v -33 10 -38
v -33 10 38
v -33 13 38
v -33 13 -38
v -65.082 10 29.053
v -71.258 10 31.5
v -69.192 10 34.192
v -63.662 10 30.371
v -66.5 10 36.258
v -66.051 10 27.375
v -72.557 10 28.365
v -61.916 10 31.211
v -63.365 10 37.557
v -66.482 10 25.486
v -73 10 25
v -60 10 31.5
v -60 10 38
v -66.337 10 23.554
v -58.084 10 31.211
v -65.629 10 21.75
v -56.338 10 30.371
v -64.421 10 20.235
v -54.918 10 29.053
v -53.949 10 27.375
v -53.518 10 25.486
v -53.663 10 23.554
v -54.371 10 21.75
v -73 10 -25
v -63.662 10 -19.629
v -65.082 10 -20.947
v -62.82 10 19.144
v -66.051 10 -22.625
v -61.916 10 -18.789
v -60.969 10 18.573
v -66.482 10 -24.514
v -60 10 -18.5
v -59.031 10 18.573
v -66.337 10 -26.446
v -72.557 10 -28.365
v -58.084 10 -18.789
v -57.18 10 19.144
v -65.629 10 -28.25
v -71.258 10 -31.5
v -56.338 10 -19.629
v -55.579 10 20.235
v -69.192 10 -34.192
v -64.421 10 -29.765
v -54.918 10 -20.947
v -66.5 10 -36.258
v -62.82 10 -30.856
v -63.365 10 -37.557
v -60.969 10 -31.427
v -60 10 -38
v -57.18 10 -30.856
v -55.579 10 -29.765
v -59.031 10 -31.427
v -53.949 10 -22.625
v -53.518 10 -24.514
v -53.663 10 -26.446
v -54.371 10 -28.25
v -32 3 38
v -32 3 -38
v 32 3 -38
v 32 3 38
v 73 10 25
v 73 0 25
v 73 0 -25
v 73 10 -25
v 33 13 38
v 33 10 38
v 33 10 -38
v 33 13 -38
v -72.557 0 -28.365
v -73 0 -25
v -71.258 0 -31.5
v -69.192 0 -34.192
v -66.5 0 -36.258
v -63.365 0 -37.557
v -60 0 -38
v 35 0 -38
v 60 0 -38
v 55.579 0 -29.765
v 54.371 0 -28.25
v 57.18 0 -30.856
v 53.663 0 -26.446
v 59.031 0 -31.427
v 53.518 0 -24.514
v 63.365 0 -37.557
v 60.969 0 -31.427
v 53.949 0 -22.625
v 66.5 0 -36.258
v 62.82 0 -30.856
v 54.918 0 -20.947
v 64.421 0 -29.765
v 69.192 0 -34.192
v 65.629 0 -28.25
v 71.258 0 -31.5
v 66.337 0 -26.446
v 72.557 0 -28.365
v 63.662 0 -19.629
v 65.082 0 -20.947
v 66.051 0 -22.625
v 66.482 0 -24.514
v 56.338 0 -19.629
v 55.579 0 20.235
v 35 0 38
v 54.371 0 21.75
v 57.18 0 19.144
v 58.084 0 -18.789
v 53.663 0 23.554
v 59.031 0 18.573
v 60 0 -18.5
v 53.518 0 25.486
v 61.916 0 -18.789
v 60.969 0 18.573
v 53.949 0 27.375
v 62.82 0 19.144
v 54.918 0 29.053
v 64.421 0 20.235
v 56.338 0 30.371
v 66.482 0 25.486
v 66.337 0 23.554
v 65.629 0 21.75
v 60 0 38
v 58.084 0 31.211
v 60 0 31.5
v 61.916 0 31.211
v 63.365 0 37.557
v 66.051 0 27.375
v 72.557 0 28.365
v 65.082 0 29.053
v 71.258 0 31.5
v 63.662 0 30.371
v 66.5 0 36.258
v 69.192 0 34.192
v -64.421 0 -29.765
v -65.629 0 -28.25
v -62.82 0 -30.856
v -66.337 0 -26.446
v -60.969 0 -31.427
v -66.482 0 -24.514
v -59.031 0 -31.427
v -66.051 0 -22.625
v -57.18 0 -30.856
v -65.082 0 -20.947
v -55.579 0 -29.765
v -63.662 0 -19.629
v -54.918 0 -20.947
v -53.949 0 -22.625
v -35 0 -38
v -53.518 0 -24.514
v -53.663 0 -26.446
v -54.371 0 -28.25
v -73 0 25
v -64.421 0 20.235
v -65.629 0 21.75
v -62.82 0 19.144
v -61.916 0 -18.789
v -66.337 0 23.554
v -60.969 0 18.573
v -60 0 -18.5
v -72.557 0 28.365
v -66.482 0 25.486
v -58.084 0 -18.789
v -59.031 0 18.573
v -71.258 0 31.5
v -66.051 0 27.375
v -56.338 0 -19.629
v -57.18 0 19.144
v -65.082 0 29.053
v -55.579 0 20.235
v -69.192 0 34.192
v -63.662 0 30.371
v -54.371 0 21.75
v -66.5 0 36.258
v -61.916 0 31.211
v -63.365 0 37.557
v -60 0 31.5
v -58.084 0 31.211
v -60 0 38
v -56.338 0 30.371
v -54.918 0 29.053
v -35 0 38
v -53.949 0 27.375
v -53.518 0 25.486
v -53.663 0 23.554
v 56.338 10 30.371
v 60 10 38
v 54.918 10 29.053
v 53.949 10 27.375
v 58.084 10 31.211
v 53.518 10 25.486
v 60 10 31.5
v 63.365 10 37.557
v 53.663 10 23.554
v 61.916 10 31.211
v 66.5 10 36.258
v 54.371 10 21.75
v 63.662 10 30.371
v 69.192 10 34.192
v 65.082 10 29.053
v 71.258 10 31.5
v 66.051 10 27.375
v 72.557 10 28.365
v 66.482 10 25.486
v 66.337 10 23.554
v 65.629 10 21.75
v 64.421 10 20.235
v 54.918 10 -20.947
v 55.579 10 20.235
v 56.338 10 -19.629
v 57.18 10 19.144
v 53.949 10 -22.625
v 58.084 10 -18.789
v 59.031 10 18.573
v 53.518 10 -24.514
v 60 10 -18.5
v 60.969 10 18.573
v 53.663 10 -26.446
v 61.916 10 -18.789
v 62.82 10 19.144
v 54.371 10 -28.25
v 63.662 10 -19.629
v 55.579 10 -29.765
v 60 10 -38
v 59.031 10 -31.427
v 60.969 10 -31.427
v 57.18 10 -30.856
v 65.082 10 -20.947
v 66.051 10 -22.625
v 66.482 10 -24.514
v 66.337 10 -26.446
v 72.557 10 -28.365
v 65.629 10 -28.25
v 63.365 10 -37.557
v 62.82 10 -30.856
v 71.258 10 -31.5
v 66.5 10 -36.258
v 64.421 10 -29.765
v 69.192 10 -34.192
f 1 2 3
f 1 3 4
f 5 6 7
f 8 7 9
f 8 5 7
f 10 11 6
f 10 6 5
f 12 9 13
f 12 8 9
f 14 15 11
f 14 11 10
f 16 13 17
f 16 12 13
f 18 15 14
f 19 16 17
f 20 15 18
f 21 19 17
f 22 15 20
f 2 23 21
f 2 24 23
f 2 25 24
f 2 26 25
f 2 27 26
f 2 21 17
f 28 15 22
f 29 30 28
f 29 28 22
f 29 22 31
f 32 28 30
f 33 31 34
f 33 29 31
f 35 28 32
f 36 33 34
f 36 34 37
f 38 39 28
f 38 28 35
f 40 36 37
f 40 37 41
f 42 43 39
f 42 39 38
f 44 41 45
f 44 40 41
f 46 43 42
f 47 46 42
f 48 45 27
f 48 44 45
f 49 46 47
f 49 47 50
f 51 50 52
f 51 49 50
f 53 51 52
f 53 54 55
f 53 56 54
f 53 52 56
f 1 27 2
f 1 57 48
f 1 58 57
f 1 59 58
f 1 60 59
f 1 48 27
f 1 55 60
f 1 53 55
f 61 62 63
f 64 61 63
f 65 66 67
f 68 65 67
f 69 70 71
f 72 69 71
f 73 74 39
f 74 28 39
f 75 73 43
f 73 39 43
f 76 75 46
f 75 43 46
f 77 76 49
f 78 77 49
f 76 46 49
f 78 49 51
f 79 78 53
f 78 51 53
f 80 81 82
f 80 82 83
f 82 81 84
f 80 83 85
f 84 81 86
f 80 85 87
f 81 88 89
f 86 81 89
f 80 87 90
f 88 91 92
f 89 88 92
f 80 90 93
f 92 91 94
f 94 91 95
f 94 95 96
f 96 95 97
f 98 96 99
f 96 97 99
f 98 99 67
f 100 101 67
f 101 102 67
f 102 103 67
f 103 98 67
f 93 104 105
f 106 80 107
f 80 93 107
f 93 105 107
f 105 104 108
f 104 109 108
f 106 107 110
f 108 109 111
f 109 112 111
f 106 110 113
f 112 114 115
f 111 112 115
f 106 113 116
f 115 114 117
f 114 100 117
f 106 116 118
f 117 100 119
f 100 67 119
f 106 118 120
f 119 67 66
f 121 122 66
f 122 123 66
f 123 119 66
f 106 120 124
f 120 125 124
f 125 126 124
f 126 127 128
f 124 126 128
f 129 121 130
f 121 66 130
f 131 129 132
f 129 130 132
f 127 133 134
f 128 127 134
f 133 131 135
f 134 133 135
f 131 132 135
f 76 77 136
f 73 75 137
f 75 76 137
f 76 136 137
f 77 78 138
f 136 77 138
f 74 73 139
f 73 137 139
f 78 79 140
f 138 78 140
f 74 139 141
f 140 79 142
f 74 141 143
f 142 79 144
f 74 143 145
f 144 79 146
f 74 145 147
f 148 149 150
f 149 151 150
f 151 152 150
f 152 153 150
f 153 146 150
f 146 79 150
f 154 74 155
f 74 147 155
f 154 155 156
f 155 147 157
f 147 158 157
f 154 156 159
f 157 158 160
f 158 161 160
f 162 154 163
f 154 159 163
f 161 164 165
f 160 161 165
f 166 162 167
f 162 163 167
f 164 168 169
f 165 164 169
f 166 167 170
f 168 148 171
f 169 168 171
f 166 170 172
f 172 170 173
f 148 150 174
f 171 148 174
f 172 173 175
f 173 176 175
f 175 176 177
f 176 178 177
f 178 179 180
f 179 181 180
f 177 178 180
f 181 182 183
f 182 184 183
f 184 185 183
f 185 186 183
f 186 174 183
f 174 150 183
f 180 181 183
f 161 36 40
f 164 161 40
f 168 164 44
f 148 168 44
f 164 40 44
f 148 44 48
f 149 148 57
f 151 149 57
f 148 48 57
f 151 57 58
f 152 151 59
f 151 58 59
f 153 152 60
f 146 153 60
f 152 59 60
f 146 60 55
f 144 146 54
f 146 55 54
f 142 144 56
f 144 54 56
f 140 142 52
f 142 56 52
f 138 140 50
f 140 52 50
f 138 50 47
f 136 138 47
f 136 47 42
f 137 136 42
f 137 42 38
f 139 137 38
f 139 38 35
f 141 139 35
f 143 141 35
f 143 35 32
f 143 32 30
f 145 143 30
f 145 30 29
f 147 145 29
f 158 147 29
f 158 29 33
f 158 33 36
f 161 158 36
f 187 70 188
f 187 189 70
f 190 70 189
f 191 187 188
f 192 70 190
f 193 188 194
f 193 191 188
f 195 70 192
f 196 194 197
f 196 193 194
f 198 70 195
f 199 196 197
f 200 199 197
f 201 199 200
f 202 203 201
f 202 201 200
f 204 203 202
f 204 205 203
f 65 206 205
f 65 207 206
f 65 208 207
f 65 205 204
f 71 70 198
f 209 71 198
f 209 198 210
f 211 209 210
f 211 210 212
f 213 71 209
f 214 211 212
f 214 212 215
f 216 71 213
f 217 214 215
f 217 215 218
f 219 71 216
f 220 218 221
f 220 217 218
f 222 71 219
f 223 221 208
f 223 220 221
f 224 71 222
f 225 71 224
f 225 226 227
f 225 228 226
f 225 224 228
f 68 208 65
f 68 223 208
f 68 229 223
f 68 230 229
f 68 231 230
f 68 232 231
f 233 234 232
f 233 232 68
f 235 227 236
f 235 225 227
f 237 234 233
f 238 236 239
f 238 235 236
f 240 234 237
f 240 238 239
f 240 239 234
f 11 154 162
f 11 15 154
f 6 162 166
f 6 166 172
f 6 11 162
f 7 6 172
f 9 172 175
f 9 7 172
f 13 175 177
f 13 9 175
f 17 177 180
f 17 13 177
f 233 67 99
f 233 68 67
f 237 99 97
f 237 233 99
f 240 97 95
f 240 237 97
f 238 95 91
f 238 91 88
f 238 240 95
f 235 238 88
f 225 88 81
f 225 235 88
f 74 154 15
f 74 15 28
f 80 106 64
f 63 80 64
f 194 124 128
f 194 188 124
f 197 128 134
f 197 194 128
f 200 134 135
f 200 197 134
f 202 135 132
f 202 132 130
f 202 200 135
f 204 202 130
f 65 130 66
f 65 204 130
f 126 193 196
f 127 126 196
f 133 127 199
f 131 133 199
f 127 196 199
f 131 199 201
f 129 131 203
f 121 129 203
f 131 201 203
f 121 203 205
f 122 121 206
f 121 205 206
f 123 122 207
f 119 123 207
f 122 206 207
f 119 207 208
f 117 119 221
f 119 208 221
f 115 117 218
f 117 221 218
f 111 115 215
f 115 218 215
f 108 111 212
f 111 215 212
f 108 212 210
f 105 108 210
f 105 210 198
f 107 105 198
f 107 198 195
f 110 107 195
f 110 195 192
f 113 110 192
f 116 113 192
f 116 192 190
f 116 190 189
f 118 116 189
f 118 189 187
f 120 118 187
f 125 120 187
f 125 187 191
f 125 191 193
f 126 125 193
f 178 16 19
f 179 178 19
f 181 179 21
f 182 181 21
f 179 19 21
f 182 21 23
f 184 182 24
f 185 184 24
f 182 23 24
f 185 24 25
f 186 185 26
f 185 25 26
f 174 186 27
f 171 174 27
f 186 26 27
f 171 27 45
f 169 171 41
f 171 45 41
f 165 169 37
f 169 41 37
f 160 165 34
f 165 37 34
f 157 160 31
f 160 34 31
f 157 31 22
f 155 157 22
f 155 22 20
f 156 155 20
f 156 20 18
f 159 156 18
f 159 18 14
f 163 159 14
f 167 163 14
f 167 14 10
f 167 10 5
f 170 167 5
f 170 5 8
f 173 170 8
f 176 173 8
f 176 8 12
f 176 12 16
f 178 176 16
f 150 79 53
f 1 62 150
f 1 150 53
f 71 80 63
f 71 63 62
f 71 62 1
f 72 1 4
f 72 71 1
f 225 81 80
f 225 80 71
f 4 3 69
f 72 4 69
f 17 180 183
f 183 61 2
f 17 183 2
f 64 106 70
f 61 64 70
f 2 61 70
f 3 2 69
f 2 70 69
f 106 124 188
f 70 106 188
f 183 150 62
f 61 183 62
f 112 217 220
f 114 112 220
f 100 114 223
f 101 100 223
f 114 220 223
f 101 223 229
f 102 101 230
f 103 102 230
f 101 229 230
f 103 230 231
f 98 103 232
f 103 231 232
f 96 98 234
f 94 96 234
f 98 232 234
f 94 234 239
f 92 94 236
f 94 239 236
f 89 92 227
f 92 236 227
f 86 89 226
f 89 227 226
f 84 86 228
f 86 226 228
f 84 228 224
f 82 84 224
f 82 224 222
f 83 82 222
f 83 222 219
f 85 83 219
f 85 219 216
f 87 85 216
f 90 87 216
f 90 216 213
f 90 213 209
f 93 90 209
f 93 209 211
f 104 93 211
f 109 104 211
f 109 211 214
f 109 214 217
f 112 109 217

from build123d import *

# Parameters (mm, degrees)
CROQUIS2_W              = 146
CROQUIS2_H              = 76
SALIENTE_EXTRUIR2_DEPTH = 10
CROQUIS3_W              = 66
CROQUIS3_H              = 76
SALIENTE_EXTRUIR3_DEPTH = 3
REDONDEO1_R             = 13
REDONDEO2_R             = 13
REDONDEO3_R             = 13
REDONDEO4_R             = 13
CROQUIS5_R              = 6.5
CORTAR_EXTRUIR1_DEPTH   = 83.903558428
CROQUIS6_W              = 72
CROQUIS6_H              = 76
CORTAR_EXTRUIR2_DEPTH   = 3
CHAFL_N1_SIZE           = 4
CHAFL_N2_SIZE           = 4


with BuildPart() as part:
    # Croquis2 → Saliente-Extruir2 (new body)
    with BuildSketch(Plane(origin=(0, 0, 0), x_dir=(1, 0, 0), z_dir=(0, 1, 0))):
        Rectangle(CROQUIS2_W, CROQUIS2_H)
    extrude(amount=SALIENTE_EXTRUIR2_DEPTH)

    # Croquis3 → Saliente-Extruir3 (add)
    with BuildSketch(Plane(origin=(0, 10, 0), x_dir=(1, 0, 0), z_dir=(0, 1, 0))):
        Rectangle(CROQUIS3_W, CROQUIS3_H)
    extrude(amount=SALIENTE_EXTRUIR3_DEPTH)

    # Redondeo1
    redondeo1_edges = [part.edges().sort_by_distance(p)[0] for p in [
        (-73, 5, -38),
    ]]
    fillet(redondeo1_edges, radius=REDONDEO1_R)

    # Redondeo2
    redondeo2_edges = [part.edges().sort_by_distance(p)[0] for p in [
        (-73, 5, 38),
    ]]
    fillet(redondeo2_edges, radius=REDONDEO2_R)

    # Redondeo3
    redondeo3_edges = [part.edges().sort_by_distance(p)[0] for p in [
        (73, 5, 38),
    ]]
    fillet(redondeo3_edges, radius=REDONDEO3_R)

    # Redondeo4
    redondeo4_edges = [part.edges().sort_by_distance(p)[0] for p in [
        (73, 5, -38),
    ]]
    fillet(redondeo4_edges, radius=REDONDEO4_R)

    # Croquis5 → Cortar-Extruir1 (cut, through all)
    with BuildSketch(Plane(origin=(0, 10, 0), x_dir=(1, 0, 0), z_dir=(0, 1, 0))):
        with Locations(Location((-60, 25, 0), (0, 0, 270))):
            Circle(CROQUIS5_R)
        with Locations(Location((-60, -25, 0), (0, 0, 270))):
            Circle(CROQUIS5_R)
        with Locations(Location((60, -25, 0), (0, 0, 270))):
            Circle(CROQUIS5_R)
        with Locations(Location((60, 25, 0), (0, 0, 270))):
            Circle(CROQUIS5_R)
    extrude(amount=-CORTAR_EXTRUIR1_DEPTH, mode=Mode.SUBTRACT)

    # Croquis6 → Cortar-Extruir2 (cut)
    with BuildSketch(Plane.XZ):
        Rectangle(CROQUIS6_W, CROQUIS6_H)
    extrude(amount=-CORTAR_EXTRUIR2_DEPTH, mode=Mode.SUBTRACT)

    # Chaflán1
    # the kernel refuses this chamfer: 4 mm, written as the material it adds along each edge
    with BuildSketch(Plane(origin=(-36, 3, 38), x_dir=(-0.027495876610585623, -0.9996219169112968, 0), z_dir=(0, 0, -1))) as chafl_n1_piece_1_section:
        Polygon((CHAFL_N1_SIZE * 0.999621916911, -CHAFL_N1_SIZE * 0.0274958766106), (-CHAFL_N1_SIZE * 0.0274958766106, -CHAFL_N1_SIZE * 0.999621916911), (0, 0), align=None)
    chafl_n1_piece_1 = extrude(amount=76, mode=Mode.PRIVATE)
    chafl_n1_piece_1 = split(chafl_n1_piece_1, bisect_by=Plane(origin=(-34.592163559, 0, 0), z_dir=(0, 1, 0)), keep=Keep.TOP, mode=Mode.PRIVATE)
    add(chafl_n1_piece_1)

    # Chaflán2
    # the kernel refuses this chamfer: 4 mm, written as the material it adds along each edge
    with BuildSketch(Plane(origin=(36, 3, -38), x_dir=(0.027495876610585623, -0.9996219169112968, 0), z_dir=(0, 0, 1))) as chafl_n2_piece_1_section:
        Polygon((CHAFL_N2_SIZE * 0.999621916911, -CHAFL_N2_SIZE * 0.0274958766106), (-CHAFL_N2_SIZE * 0.0274958766106, -CHAFL_N2_SIZE * 0.999621916911), (0, 0), align=None)
    chafl_n2_piece_1 = extrude(amount=76, mode=Mode.PRIVATE)
    chafl_n2_piece_1 = split(chafl_n2_piece_1, bisect_by=Plane(origin=(34.592163559, 0, 0), z_dir=(0, 1, 0)), keep=Keep.TOP, mode=Mode.PRIVATE)
    add(chafl_n2_piece_1)


solid = part.part
